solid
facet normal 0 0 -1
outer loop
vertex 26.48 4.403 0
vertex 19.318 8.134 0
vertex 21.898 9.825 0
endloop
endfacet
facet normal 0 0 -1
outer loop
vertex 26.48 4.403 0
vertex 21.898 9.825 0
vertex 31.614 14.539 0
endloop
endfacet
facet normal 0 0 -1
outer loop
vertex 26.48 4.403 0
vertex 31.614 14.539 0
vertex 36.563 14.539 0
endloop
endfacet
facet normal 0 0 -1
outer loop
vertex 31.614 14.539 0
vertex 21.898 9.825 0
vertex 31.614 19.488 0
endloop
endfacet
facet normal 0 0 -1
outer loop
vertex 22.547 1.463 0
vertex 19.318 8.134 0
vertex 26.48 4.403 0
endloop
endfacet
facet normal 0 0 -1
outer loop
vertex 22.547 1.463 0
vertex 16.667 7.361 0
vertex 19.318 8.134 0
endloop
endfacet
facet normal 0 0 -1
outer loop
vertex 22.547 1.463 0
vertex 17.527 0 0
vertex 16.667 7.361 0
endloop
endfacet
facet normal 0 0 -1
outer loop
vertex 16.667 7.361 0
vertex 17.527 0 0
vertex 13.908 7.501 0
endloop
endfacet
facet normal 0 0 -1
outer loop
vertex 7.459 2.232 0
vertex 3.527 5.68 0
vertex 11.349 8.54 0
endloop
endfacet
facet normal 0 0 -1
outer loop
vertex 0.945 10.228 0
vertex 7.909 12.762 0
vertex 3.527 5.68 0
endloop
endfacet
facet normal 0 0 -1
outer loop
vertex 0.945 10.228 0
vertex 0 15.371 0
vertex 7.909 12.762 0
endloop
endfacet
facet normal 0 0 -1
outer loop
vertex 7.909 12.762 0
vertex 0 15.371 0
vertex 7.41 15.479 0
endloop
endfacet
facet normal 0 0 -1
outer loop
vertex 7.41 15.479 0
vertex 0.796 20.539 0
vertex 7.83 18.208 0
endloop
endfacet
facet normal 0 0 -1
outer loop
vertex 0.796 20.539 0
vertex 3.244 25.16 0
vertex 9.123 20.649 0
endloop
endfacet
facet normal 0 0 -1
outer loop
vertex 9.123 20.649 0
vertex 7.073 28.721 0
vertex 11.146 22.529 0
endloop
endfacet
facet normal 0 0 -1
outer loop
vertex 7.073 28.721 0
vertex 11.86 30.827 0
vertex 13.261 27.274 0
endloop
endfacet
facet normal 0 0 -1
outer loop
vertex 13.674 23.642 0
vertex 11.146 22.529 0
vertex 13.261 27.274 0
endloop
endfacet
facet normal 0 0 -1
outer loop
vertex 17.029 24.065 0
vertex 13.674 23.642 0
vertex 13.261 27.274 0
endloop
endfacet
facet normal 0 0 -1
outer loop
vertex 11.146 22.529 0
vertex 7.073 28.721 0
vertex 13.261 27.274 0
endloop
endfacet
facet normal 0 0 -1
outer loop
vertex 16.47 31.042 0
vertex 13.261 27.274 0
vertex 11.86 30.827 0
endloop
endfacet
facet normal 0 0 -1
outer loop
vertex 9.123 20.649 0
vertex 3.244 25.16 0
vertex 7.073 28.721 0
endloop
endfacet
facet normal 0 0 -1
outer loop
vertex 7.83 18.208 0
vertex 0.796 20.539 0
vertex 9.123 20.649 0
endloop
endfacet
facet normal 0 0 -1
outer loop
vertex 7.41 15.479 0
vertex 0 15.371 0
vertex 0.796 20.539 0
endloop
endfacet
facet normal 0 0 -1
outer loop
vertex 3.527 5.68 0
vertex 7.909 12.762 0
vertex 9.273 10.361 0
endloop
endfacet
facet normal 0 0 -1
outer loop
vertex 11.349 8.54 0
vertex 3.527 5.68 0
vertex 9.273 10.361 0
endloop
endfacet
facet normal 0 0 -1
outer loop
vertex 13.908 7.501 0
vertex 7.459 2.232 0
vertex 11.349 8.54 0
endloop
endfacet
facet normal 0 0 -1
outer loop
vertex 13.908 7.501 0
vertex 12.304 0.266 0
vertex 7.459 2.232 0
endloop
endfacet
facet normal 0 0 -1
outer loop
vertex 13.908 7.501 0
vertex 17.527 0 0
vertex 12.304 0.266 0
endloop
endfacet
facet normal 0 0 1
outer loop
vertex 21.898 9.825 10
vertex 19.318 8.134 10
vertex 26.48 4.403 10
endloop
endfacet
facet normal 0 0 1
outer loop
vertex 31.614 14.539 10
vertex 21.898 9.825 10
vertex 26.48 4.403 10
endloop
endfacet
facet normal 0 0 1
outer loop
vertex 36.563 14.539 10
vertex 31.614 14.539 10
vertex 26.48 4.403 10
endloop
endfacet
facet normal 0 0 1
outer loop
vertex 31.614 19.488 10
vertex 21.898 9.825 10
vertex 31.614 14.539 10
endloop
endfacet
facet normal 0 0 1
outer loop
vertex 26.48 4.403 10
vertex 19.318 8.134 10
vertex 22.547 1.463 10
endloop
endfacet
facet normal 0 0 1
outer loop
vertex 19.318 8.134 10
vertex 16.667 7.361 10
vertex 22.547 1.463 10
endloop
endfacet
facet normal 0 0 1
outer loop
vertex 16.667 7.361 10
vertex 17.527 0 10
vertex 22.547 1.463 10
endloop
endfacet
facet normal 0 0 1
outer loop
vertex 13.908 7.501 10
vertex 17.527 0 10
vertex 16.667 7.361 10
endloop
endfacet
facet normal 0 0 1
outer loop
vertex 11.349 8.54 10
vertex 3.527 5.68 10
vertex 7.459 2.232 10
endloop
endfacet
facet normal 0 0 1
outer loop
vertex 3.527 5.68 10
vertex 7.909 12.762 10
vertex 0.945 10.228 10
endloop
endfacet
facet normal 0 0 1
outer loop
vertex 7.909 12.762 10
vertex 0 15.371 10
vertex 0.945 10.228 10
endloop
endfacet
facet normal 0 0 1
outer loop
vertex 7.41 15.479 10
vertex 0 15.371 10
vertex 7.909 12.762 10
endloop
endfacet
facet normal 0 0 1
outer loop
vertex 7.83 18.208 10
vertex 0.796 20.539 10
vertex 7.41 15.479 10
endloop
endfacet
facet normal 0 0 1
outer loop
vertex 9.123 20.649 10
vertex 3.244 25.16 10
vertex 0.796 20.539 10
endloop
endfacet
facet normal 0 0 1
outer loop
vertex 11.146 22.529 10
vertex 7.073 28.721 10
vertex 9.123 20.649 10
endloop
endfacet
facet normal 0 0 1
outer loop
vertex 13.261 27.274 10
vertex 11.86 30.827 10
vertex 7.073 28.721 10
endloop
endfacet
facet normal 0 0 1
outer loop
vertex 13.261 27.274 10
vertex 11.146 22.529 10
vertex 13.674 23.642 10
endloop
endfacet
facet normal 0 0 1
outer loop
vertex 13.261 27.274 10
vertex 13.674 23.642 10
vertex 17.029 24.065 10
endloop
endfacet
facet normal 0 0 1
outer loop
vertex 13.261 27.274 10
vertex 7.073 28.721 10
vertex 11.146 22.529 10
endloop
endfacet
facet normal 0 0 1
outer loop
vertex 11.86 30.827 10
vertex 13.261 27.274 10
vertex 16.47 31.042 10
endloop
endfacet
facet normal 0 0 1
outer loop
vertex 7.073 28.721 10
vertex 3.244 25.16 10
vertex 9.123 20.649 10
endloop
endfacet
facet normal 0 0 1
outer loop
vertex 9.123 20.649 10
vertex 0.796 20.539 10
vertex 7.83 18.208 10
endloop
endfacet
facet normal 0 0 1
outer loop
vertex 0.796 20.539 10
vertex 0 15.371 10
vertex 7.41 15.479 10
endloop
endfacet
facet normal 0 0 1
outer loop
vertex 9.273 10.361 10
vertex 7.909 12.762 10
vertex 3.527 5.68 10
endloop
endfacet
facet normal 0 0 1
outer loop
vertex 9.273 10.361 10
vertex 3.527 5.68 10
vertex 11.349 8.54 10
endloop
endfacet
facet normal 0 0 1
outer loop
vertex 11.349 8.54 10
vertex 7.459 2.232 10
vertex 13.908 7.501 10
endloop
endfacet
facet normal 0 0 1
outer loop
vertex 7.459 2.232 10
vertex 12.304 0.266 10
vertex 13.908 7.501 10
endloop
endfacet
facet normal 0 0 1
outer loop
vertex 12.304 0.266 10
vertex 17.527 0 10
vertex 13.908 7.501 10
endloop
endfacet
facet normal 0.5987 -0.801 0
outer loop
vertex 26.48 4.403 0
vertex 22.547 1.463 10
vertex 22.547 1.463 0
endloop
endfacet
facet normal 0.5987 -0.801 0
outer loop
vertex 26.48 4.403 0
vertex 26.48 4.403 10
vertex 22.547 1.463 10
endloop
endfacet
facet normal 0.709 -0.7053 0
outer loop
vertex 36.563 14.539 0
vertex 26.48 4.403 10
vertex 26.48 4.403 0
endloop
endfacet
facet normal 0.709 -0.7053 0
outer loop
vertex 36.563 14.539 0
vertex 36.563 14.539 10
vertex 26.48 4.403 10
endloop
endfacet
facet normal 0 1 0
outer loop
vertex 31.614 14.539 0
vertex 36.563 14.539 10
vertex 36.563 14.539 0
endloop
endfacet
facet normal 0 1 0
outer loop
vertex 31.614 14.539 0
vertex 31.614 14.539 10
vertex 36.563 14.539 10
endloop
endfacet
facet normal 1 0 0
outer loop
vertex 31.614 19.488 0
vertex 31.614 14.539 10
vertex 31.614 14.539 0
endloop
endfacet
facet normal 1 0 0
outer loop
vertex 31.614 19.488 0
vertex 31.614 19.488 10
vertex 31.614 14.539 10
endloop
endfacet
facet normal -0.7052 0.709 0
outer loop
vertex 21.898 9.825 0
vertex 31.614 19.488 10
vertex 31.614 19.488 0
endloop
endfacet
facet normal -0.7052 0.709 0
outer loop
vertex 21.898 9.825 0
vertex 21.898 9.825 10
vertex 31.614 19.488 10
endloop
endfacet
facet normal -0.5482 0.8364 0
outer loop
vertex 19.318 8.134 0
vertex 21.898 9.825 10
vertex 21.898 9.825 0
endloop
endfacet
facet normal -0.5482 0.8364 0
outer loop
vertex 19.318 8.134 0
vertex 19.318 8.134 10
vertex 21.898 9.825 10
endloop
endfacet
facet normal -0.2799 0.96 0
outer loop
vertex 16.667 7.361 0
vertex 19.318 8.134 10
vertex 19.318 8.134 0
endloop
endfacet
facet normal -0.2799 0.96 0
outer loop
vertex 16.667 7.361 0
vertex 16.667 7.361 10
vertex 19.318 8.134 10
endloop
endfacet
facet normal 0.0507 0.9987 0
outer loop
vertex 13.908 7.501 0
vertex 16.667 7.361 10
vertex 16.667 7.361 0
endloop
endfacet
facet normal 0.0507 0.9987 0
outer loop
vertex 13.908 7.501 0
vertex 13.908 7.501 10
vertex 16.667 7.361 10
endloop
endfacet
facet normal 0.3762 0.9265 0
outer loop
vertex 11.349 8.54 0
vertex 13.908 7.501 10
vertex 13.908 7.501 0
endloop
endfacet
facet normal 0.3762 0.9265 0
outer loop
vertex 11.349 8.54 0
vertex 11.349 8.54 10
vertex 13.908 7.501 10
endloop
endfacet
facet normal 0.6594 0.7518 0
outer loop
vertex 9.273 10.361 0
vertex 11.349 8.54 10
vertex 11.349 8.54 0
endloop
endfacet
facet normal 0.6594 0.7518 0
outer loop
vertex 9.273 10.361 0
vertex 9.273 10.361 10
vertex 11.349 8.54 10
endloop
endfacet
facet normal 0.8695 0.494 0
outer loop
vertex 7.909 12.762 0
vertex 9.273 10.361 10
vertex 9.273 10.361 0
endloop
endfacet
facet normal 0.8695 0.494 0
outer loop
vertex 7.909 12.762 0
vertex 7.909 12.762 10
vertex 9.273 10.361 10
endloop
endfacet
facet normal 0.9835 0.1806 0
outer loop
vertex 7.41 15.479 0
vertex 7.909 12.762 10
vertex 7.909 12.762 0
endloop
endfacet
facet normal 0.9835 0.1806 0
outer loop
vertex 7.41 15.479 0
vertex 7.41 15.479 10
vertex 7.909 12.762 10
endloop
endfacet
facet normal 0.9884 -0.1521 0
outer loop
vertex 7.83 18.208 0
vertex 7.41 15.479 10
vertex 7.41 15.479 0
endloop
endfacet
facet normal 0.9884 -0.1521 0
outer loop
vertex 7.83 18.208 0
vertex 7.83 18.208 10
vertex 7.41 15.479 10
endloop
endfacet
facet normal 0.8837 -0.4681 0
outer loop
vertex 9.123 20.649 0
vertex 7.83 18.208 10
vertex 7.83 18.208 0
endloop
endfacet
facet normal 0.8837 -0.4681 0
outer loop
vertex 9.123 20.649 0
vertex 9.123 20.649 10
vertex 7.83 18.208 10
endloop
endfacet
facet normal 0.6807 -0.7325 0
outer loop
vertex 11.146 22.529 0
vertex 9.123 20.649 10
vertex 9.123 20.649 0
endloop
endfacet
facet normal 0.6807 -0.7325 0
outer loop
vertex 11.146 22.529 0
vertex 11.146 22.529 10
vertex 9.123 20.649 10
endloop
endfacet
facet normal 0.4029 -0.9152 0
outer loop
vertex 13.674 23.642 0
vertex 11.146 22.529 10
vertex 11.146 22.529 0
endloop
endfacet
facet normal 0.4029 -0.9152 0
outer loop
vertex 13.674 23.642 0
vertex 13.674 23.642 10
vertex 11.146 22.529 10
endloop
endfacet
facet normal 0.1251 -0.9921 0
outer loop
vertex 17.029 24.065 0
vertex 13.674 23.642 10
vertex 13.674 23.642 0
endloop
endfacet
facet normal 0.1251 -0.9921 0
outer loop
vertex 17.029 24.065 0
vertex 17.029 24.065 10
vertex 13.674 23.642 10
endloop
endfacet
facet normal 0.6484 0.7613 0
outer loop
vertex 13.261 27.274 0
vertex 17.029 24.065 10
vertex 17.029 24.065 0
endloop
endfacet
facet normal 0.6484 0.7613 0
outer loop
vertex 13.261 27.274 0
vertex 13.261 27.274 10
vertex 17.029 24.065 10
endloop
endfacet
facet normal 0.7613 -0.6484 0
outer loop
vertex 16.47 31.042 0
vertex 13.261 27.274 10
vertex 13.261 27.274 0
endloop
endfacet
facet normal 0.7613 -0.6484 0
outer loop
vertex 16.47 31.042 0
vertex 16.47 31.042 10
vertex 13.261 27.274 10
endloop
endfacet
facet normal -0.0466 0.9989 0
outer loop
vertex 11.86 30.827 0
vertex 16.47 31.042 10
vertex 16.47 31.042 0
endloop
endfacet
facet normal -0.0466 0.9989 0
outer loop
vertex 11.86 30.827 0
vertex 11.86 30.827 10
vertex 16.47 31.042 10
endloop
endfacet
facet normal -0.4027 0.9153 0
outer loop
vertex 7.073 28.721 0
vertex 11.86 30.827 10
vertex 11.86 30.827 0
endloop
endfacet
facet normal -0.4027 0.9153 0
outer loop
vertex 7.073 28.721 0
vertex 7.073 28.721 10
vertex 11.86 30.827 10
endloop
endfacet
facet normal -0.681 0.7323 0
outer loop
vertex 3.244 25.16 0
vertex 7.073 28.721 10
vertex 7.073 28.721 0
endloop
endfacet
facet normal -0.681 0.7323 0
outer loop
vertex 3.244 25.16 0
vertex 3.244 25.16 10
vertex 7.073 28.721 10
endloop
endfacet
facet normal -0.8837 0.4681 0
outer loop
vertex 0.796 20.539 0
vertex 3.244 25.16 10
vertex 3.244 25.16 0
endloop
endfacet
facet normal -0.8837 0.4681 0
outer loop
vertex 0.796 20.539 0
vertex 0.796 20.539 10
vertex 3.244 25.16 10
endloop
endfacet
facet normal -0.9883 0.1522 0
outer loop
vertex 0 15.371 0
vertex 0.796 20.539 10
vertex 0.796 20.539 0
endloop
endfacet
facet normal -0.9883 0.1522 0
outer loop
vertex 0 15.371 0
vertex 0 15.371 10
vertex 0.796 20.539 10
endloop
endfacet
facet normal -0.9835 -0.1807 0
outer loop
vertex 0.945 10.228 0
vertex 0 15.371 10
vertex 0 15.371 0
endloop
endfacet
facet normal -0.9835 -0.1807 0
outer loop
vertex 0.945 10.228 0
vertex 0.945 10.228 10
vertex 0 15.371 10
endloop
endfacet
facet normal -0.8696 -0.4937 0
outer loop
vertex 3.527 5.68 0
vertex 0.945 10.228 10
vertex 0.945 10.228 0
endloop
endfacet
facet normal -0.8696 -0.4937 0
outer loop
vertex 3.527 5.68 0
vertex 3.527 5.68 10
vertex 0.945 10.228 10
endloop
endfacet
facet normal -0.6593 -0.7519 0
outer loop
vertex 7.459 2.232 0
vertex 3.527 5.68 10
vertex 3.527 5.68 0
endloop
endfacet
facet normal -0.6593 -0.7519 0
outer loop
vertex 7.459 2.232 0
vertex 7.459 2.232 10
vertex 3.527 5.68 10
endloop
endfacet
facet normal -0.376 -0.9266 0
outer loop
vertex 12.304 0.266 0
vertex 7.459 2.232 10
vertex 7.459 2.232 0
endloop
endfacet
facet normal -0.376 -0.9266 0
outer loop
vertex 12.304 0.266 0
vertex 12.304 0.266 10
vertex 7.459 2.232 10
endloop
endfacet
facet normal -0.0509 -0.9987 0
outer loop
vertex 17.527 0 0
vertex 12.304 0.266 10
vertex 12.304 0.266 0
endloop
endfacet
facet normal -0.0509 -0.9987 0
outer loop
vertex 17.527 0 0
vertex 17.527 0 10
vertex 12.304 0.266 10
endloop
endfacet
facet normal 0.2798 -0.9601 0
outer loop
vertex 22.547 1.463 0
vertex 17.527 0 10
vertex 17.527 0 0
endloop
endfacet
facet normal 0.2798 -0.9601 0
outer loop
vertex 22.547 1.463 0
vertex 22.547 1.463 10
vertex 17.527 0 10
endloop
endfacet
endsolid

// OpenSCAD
$fn = 32;

// ----------------------------------------------------------------------
// Eye lug: ring_tail, 10 mm thick
// ----------------------------------------------------------------------

// --- parameters (mm) ---
profile_height = 10;      // extrusion height
profile_points = 30;      // points of the closed outline

profile = [[13.261, 27.274], [16.47, 31.042], [11.86, 30.827], [7.073, 28.721], [3.244, 25.16], [0.796, 20.539], [0, 15.371], [0.945, 10.228], [3.527, 5.68], [7.459, 2.232], [12.304, 0.266], [17.527, 0], [22.547, 1.463], [26.48, 4.403], [36.563, 14.539], [31.614, 14.539], [31.614, 19.488], [21.898, 9.825], [19.318, 8.134], [16.667, 7.361], [13.908, 7.501], [11.349, 8.54], [9.273, 10.361], [7.909, 12.762], [7.41, 15.479], [7.83, 18.208], [9.123, 20.649], [11.146, 22.529], [13.674, 23.642], [17.029, 24.065]];  // single closed polygon, 30 points, counter clockwise

// --- the one profile operation ---
linear_extrude(height = profile_height) polygon(points = profile);
